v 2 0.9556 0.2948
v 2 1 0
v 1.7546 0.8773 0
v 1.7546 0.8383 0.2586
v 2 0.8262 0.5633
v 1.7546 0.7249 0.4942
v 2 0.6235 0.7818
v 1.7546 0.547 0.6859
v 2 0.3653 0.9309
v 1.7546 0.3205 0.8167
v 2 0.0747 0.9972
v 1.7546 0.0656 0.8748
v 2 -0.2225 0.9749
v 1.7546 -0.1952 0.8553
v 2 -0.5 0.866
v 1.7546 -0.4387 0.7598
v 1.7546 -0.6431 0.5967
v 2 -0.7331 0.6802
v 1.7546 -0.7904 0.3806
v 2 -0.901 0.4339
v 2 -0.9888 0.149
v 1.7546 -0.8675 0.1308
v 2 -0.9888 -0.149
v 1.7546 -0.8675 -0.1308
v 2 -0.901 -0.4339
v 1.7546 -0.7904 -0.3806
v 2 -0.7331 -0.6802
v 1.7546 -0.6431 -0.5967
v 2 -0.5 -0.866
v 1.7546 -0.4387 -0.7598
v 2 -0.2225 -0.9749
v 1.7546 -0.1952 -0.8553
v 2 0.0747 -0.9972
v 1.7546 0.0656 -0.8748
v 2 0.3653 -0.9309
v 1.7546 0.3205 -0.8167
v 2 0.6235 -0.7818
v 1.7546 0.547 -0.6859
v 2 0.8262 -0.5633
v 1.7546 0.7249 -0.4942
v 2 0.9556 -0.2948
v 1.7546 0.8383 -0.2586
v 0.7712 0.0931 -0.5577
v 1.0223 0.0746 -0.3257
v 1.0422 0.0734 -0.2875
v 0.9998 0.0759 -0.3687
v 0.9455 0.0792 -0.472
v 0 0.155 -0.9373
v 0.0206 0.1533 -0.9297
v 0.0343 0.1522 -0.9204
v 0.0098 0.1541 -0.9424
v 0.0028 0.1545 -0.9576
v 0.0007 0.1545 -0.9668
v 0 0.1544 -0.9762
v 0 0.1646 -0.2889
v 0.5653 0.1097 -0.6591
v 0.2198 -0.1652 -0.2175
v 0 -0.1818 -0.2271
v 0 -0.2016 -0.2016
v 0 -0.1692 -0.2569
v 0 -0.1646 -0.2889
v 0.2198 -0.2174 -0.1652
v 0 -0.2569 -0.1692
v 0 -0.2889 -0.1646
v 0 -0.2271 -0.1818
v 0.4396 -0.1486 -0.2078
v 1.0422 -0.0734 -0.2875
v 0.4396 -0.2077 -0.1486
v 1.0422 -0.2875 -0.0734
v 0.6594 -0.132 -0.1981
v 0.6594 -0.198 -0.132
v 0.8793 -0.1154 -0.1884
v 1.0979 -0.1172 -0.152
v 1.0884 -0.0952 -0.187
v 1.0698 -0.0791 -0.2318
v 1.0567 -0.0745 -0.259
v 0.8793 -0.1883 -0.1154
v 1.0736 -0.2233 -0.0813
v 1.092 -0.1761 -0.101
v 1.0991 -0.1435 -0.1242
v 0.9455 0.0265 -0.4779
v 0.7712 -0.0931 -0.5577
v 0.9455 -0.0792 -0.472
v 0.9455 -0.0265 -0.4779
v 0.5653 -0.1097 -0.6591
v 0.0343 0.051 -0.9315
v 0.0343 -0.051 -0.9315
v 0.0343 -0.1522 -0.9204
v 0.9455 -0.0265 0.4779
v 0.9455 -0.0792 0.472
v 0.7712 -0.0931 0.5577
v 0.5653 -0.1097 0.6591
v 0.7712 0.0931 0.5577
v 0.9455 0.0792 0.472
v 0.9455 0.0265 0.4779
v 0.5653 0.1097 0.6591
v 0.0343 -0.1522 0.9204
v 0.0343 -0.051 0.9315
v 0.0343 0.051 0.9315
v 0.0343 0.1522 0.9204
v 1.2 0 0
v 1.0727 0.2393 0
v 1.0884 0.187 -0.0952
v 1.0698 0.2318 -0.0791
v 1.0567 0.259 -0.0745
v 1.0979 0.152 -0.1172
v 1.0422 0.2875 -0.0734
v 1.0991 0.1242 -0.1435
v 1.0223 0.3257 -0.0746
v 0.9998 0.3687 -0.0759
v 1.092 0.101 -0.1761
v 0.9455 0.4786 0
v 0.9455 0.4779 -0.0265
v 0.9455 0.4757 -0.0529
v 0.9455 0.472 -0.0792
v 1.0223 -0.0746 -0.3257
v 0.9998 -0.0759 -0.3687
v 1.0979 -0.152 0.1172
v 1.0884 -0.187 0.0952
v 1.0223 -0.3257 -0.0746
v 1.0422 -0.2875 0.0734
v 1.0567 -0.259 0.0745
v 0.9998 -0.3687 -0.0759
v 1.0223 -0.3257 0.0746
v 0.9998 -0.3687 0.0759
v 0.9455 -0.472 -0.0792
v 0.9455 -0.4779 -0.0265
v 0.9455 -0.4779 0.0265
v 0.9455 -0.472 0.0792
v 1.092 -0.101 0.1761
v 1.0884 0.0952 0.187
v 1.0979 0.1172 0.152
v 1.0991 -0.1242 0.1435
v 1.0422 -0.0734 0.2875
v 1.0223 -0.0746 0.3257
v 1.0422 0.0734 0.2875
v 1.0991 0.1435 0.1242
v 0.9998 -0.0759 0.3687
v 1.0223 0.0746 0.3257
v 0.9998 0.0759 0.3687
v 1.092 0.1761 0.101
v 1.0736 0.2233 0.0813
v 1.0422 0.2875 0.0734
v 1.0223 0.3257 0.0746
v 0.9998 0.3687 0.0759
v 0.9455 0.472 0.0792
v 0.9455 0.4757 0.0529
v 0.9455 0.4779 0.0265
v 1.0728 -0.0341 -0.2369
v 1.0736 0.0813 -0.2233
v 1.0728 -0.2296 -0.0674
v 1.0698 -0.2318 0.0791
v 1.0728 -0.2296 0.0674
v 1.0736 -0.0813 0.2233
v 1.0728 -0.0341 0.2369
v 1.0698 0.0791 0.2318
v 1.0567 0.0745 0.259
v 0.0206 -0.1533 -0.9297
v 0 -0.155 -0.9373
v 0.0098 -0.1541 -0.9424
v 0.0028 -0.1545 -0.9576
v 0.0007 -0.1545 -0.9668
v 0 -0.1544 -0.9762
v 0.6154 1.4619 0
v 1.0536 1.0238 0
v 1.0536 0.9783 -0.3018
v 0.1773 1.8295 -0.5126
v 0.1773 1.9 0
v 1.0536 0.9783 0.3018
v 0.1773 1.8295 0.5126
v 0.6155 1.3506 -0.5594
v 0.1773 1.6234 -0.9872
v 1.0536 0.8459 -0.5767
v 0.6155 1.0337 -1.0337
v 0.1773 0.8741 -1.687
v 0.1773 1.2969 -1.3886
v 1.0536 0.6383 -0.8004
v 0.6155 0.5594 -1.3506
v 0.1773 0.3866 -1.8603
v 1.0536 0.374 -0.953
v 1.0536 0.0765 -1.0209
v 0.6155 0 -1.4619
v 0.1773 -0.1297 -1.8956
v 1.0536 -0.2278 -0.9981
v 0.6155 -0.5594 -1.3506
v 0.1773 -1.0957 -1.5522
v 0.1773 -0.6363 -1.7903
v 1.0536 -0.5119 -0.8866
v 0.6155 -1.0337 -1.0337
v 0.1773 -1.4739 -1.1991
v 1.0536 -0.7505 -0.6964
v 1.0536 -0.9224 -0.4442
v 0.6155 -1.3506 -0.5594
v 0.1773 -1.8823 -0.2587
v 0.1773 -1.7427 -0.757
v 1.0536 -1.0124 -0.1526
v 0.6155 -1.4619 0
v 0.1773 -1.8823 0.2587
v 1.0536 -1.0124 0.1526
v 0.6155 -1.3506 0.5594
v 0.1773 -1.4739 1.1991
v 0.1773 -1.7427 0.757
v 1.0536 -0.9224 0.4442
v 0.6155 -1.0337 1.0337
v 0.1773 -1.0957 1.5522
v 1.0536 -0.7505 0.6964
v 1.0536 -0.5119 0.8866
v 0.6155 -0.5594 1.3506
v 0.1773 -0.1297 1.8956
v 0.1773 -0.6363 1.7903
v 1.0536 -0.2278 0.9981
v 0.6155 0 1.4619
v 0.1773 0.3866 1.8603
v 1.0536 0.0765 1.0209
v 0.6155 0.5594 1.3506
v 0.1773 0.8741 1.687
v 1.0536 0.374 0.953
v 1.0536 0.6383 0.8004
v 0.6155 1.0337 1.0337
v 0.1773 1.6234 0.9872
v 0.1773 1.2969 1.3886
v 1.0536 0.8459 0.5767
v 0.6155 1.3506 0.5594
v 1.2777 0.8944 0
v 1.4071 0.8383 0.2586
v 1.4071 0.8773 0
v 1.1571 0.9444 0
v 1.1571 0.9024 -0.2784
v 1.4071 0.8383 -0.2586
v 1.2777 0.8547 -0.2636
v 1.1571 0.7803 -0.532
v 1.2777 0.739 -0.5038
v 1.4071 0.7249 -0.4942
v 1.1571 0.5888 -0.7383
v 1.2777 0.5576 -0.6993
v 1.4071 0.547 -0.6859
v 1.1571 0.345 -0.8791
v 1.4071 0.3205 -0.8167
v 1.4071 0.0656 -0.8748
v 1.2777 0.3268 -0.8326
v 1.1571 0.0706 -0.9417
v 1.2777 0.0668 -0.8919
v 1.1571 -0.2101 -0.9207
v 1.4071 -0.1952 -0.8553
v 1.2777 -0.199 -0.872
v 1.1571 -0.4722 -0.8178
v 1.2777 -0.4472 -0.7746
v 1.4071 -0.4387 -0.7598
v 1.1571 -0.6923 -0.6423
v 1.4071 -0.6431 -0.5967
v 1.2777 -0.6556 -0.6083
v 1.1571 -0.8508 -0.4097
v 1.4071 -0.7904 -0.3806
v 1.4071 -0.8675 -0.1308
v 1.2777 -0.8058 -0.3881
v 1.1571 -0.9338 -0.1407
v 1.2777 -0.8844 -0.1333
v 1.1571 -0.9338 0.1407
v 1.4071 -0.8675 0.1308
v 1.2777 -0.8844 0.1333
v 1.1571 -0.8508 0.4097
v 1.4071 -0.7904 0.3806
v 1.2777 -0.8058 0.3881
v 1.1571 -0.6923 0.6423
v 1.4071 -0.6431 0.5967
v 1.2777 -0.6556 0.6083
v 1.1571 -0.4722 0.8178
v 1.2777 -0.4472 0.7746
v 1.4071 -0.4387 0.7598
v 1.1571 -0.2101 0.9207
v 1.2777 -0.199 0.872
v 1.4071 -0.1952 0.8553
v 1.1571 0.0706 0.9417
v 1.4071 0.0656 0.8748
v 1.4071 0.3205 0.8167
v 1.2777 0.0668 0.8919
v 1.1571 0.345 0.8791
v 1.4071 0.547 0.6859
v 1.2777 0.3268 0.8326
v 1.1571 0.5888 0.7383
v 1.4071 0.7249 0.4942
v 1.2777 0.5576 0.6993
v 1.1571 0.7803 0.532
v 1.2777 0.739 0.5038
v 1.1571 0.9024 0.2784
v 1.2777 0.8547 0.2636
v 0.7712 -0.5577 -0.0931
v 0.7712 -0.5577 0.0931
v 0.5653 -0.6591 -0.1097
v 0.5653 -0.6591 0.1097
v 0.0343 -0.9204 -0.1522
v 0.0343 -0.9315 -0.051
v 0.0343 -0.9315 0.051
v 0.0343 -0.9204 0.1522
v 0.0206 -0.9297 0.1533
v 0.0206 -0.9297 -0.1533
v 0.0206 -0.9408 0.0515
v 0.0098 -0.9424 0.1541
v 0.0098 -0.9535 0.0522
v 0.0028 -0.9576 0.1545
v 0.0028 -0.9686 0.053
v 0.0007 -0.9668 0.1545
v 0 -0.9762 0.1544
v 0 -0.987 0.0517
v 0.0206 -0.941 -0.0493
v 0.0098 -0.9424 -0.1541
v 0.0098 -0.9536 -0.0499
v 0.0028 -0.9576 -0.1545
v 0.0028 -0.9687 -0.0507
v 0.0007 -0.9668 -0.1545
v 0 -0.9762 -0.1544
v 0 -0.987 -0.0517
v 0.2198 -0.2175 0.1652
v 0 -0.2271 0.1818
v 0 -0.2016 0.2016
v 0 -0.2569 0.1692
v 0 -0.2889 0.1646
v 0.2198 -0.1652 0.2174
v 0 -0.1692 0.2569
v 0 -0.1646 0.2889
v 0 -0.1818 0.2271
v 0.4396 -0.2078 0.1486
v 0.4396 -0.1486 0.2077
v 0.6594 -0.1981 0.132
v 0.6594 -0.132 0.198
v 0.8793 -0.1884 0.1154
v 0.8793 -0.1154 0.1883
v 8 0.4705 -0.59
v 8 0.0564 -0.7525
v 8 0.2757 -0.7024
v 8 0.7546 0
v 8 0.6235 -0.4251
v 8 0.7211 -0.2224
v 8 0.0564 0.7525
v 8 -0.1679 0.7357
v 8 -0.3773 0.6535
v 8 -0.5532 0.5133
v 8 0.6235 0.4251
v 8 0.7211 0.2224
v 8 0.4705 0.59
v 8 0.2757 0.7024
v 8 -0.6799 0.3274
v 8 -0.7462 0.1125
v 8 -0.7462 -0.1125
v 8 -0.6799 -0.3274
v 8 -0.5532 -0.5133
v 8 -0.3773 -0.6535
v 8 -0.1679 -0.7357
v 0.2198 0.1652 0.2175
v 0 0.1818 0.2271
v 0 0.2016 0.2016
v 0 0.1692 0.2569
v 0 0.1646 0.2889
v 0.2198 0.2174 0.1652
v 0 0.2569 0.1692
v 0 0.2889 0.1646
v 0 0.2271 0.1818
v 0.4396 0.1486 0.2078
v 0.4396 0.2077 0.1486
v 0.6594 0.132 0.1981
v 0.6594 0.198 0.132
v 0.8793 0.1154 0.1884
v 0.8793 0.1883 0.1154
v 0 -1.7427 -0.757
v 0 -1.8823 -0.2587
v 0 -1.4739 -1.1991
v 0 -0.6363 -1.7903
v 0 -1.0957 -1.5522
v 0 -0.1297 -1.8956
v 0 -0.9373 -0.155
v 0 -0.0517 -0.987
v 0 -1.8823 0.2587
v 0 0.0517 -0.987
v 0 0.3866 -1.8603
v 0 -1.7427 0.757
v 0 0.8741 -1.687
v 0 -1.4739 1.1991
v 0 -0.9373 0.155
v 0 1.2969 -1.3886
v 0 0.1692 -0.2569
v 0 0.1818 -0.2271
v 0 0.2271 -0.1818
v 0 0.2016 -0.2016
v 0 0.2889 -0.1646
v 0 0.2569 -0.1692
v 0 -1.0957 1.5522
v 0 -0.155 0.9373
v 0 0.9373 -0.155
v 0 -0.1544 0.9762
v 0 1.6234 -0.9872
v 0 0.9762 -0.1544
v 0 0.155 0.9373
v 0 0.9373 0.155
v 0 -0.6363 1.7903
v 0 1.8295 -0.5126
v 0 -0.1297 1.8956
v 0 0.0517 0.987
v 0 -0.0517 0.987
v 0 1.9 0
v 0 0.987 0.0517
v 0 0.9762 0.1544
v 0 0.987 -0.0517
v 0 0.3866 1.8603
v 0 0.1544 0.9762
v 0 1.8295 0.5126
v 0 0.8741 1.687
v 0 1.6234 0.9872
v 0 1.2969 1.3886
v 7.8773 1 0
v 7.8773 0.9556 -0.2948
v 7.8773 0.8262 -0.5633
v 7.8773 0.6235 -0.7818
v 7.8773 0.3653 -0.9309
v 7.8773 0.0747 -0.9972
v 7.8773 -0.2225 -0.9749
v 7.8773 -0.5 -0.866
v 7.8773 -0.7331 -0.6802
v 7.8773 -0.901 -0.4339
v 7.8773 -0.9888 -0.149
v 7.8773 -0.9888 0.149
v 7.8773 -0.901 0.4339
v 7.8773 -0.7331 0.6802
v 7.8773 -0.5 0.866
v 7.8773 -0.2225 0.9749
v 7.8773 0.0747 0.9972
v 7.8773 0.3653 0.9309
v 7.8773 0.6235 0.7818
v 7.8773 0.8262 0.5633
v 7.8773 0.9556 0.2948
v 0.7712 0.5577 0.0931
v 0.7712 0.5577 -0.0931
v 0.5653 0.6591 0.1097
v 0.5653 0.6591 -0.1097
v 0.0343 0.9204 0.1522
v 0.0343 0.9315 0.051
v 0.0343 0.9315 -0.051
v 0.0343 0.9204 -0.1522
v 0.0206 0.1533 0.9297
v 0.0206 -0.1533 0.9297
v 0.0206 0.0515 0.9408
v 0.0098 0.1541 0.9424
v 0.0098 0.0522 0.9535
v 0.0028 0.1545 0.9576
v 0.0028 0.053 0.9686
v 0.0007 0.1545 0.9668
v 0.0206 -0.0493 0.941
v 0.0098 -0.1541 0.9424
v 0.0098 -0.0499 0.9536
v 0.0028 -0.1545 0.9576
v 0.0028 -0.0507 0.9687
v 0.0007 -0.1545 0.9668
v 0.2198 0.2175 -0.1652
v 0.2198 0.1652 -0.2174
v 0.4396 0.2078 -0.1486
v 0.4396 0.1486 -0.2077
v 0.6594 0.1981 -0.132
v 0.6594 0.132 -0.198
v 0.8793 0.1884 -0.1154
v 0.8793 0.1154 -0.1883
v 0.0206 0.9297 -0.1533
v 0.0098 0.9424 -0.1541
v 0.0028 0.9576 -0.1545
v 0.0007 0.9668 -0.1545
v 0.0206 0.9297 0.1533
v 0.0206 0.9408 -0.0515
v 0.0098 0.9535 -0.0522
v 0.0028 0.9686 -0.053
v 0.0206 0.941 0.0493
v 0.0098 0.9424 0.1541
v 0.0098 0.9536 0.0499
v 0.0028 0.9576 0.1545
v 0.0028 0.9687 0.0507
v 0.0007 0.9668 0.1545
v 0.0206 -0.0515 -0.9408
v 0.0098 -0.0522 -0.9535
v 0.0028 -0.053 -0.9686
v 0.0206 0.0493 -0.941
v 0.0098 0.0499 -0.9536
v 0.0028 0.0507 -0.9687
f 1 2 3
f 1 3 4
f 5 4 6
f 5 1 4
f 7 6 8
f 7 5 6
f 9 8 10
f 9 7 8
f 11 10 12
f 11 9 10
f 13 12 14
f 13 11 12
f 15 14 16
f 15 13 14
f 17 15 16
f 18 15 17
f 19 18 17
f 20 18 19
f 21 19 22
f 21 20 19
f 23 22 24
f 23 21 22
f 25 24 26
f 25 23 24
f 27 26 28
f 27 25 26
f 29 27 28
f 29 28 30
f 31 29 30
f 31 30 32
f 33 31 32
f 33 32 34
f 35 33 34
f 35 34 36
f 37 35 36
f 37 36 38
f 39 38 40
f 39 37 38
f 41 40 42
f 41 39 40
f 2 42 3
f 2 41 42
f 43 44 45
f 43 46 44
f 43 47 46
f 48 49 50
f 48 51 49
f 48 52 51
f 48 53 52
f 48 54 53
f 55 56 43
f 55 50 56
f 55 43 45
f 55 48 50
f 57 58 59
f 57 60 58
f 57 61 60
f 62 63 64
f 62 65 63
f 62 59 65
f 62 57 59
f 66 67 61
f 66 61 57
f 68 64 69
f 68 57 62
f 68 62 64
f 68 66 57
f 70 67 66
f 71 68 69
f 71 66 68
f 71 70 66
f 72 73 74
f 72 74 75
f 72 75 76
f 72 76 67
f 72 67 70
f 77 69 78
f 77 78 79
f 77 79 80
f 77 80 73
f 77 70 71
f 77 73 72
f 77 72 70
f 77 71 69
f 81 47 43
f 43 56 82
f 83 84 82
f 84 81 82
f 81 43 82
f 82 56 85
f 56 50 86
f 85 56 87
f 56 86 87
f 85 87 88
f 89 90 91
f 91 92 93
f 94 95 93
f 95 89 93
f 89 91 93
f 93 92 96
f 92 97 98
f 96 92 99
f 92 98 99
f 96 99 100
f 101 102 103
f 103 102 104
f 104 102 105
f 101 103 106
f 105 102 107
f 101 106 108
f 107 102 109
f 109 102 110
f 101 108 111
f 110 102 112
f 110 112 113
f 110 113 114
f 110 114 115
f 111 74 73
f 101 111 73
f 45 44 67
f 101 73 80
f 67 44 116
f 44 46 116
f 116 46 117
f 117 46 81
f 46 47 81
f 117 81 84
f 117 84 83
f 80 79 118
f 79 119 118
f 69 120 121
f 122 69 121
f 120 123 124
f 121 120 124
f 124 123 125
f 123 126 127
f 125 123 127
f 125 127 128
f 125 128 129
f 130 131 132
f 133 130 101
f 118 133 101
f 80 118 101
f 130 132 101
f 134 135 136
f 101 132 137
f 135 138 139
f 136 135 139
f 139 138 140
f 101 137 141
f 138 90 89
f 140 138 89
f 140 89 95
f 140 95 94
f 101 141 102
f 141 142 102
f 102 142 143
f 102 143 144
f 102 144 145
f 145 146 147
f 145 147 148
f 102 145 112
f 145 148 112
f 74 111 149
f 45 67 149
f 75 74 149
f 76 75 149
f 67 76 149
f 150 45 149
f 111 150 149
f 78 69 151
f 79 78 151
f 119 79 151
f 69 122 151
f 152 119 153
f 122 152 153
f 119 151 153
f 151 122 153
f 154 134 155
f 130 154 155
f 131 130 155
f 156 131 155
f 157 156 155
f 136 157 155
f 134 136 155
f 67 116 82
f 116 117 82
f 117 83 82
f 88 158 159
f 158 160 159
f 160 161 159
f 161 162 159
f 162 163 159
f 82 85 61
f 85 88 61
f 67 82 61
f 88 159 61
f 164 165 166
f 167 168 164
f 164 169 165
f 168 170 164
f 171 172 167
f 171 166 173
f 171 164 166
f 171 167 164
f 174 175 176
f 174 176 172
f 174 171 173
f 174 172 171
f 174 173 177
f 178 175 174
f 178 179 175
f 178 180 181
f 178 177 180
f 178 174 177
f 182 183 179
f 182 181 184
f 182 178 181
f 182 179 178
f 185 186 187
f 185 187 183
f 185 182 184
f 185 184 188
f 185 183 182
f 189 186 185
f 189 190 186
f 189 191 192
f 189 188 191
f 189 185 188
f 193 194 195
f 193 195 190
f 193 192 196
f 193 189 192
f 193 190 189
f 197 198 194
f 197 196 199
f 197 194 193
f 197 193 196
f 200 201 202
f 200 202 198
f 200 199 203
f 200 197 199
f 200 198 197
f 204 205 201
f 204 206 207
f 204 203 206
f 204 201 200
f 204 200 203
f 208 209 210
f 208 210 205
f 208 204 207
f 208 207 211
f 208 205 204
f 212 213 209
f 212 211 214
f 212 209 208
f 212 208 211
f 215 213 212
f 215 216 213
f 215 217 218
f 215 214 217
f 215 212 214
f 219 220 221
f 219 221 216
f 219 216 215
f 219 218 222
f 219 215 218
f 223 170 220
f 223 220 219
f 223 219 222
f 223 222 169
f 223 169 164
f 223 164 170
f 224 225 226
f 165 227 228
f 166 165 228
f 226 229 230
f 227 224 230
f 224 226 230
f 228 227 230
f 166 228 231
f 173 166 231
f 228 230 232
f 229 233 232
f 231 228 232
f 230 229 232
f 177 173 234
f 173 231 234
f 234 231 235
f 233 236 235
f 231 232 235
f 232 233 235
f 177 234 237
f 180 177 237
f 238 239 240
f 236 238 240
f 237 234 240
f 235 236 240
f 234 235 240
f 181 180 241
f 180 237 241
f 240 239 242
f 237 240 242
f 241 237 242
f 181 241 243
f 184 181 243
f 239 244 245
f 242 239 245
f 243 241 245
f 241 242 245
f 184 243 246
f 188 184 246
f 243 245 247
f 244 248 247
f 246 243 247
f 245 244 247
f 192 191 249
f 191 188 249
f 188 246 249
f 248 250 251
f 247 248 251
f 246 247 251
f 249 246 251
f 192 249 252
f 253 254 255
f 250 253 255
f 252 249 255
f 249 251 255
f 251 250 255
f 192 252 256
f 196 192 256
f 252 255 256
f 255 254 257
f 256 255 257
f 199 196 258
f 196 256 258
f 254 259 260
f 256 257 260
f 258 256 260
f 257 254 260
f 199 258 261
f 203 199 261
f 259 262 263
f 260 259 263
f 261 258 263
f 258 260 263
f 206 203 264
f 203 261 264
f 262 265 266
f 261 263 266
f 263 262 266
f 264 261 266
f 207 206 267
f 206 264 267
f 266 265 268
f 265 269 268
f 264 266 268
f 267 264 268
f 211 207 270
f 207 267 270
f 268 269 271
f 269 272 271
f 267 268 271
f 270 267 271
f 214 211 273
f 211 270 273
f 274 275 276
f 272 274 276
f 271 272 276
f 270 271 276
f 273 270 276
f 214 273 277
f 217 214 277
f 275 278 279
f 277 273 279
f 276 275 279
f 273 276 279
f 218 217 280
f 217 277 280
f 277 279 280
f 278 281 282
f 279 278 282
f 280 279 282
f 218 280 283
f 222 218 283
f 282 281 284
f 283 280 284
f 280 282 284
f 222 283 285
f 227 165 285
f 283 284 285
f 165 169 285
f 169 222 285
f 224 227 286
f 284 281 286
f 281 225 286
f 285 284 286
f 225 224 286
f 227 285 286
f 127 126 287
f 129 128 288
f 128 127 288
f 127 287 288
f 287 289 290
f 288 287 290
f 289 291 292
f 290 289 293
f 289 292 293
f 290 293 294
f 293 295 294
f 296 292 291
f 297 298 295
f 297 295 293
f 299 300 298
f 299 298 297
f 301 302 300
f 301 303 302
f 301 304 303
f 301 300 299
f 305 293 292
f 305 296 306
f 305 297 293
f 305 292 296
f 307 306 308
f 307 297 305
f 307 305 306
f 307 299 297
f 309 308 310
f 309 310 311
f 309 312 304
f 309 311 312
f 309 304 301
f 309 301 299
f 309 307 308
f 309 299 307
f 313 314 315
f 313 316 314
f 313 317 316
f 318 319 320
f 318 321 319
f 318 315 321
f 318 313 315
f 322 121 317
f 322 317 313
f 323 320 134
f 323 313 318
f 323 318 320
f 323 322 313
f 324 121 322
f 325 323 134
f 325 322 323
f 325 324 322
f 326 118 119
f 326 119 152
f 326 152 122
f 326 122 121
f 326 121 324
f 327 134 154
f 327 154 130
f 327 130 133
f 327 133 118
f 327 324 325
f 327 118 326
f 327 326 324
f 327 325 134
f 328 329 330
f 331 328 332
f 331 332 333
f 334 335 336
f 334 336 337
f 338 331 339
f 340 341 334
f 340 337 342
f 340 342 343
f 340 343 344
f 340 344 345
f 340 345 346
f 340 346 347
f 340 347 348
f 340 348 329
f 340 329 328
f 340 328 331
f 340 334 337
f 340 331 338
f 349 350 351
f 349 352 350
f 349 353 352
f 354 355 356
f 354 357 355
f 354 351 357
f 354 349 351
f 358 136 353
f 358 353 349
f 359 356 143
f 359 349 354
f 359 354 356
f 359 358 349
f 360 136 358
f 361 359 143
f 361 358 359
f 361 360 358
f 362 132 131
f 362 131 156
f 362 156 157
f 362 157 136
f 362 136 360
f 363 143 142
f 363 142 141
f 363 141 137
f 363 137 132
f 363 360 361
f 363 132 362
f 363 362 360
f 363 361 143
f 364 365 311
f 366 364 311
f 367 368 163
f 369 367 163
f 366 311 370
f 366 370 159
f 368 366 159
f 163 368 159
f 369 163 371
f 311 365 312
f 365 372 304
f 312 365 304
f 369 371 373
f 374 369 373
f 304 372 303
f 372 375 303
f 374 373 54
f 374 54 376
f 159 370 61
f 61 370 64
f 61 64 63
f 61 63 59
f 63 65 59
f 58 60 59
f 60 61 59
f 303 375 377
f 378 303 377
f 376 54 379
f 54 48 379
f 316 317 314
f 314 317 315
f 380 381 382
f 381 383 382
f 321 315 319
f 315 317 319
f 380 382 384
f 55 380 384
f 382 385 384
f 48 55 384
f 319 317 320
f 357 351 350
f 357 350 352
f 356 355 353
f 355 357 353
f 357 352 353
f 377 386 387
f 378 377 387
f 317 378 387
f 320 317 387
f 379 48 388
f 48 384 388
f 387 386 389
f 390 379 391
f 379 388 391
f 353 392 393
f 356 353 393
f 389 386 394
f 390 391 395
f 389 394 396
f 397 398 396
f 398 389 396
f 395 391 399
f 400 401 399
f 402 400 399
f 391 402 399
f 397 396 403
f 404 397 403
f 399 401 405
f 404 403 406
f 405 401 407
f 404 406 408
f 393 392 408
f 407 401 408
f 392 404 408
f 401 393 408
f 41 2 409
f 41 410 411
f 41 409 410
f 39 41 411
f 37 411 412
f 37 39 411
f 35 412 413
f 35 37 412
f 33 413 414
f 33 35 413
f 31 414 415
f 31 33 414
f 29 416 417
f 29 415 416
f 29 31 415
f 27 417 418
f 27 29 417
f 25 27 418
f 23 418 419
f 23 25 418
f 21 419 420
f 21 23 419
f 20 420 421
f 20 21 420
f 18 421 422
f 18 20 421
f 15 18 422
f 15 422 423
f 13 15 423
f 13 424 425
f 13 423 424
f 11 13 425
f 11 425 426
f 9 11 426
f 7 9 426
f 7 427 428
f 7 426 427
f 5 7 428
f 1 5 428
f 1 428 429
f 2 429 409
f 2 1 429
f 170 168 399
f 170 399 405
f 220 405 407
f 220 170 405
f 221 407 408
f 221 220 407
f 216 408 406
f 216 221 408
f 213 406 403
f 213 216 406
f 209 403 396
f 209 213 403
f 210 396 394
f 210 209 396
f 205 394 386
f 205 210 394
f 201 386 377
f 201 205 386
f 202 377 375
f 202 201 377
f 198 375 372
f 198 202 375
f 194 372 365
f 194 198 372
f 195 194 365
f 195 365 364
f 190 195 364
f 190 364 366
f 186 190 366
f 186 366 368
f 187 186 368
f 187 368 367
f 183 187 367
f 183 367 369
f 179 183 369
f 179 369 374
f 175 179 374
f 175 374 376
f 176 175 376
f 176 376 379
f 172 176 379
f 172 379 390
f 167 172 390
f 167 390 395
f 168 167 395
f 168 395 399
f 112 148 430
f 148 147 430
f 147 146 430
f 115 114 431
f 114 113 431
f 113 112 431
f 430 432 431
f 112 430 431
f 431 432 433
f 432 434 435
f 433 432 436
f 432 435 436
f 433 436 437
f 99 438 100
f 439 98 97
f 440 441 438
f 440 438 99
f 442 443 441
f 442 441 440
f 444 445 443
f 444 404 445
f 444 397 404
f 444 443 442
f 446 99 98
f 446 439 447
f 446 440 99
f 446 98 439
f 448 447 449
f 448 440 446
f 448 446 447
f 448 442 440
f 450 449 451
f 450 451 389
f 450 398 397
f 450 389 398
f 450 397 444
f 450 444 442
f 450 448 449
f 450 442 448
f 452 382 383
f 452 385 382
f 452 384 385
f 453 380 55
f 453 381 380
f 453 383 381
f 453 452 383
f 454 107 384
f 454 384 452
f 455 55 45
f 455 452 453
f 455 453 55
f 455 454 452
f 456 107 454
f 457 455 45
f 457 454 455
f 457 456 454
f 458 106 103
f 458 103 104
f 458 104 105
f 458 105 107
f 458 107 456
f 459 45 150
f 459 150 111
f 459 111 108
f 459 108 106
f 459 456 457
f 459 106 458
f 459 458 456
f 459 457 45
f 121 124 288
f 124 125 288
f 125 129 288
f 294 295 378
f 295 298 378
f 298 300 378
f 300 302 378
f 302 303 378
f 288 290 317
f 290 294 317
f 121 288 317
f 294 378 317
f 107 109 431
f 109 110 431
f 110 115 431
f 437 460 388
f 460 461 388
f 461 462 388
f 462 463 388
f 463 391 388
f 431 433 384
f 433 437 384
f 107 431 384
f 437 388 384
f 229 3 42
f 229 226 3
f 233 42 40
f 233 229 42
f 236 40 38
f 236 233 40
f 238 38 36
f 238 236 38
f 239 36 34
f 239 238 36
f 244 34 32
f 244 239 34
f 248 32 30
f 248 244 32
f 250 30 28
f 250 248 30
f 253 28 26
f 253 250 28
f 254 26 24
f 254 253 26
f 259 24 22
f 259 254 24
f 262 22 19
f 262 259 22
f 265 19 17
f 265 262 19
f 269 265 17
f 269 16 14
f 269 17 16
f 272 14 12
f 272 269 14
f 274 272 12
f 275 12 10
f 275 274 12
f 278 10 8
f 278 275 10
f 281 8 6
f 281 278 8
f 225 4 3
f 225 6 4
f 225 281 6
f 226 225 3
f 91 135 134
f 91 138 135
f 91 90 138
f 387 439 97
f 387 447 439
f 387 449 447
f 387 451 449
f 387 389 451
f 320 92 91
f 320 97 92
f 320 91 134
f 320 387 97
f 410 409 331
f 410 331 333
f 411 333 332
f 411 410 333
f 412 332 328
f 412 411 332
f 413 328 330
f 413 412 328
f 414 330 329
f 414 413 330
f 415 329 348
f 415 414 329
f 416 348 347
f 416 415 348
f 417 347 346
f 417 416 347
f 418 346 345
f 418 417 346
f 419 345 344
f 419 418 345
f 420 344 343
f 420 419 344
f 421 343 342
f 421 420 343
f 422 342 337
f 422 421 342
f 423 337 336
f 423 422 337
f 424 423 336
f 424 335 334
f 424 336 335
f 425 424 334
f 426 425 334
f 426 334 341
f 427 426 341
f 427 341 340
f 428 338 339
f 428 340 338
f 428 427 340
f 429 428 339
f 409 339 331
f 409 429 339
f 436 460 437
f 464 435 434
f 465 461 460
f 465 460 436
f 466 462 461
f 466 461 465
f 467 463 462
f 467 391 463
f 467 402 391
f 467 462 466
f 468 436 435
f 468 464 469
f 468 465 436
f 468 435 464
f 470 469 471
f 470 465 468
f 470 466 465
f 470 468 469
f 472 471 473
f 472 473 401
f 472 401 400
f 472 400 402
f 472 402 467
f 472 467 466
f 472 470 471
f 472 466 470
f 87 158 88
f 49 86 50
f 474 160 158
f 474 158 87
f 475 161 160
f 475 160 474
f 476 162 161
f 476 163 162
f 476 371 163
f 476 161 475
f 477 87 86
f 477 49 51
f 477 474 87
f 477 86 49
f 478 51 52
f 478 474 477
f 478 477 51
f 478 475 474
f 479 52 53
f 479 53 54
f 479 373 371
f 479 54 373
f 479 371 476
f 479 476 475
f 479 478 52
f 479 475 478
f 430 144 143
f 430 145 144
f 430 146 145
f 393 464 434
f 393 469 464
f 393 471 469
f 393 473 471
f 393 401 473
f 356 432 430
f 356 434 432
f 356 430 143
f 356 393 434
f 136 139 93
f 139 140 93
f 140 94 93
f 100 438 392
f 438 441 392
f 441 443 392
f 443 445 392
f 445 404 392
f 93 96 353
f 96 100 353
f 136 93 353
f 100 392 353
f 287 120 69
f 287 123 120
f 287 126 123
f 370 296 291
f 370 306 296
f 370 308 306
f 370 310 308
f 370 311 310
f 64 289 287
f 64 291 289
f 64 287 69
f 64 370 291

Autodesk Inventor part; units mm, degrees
ref_plane "YZ Plane" through (0, 0, 0) normal (1, 0, 0) x (0, 1, 0)
ref_plane "XZ Plane" through (0, 0, 0) normal (0, 1, 0) x (-1, 0, 0)
sketch "Sketch1" plane through (0, 0, 0) normal (0, 0, 1) x (1, 0, 0)
  line L0 (1.2, 0) -> (8, 0)
  line L1 (8, 0) -> (8, 1)
  line L2 (8, 1) -> (2, 1)
  line L3 (2, 1) -> (1.7546, 0.8773)
  line L4 (1.7546, 0.8773) -> (1.4071, 0.8773)
  line L5 (0, 1.9) -> (0, 0.95)
  line L6 (0, 0.95) -> (0.9455, 0.4786)
  line L7 (0.9455, 0.4786) -> (1.2, 0)
  line L8 (-1.6, 0) -> (9.6, 0) projected
  line L9 (0, -0.38) -> (0, 2.28) projected
  line L10 (0, 1.9) -> (0.1773, 1.9)
  line L11 (0.1773, 1.9) -> (1.0536, 1.0238)
  line L12 (2, 1) -> (1.0773, 1) construction
  arc A0 (1.0536, 1.0238) -> (1.4071, 0.8773) centre (1.4071, 1.3773) ccw
  point P0 (1.2, 0.8773)
  dimension "d1" = 6
  dimension "d2" = 2
  dimension "d3" = 1.7546
  dimension "d4" = 1.9
  dimension "d5" = 26.5
  dimension "d6" = 62
  dimension "d7" = 1.2
  dimension "d8" = 0.2454
  dimension "d12" = 3.8
  dimension "d13" = 45
  dimension "d15" = 8
  dimension "d24" = 1.2
  dimension "d93" = 0.5
revolve "Body" add sketch "Sketch1" angle 360 about axis through (1.2, 0, 0) along (1, 0, 0) contours L7 L6 L5 L10 L11 A0 L4 L3 L2 L1 L0
sketch "Sketch2" plane through (0, 0, 0) normal (-1, 0, 0) x (0, 0, 1)
  line L0 (0, 0.95) -> (0, 0) construction
  line L1 (0, 0) -> (0.95, 0) construction
  arc A0 (0.285, 0) -> (0, 0.285) centre (0, 0) ccw construction
  arc A1 (0.3325, 0) -> (0, 0.3325) centre (0, 0) ccw construction
  arc A2 (0.9373, 0.155) -> (0.155, 0.9373) centre (0, 0) ccw
  line L2 (0, 0) -> (0.6718, 0.6718) construction
  line L3 (0.155, 0.9373) -> (0.1646, 0.2889)
  line L4 (0.9373, 0.155) -> (0.2889, 0.1646)
  arc A3 (0.155, 0.9373) -> (0, 0.95) centre (0, 0) ccw
  arc A4 (0.95, 0) -> (0.9373, 0.155) centre (0, 0) ccw
  line L5 (0, -2.66) -> (0, 2.66) projected
  line L6 (-2.66, 0) -> (2.66, 0) projected
  arc A5 (0.155, -0.9373) -> (0.9373, -0.155) centre (0, 0) ccw
  line L7 (0.155, -0.9373) -> (0.1646, -0.2889)
  line L8 (0.9373, -0.155) -> (0.2889, -0.1646)
  arc A6 (0, -0.95) -> (0.155, -0.9373) centre (0, 0) ccw
  arc A7 (0.9373, -0.155) -> (0.95, 0) centre (0, 0) ccw
  arc A8 (-0.155, 0.9373) -> (-0.9373, 0.155) centre (0, 0) ccw
  line L9 (-0.155, 0.9373) -> (-0.1646, 0.2889)
  line L10 (-0.9373, 0.155) -> (-0.2889, 0.1646)
  arc A9 (0, 0.95) -> (-0.155, 0.9373) centre (0, 0) ccw
  arc A10 (-0.9373, 0.155) -> (-0.95, 0) centre (0, 0) ccw
  arc A11 (-0.155, -0.9373) -> (0, -0.95) centre (0, 0) ccw
  arc A12 (-0.9373, -0.155) -> (-0.155, -0.9373) centre (0, 0) ccw
  arc A13 (-0.95, 0) -> (-0.9373, -0.155) centre (0, 0) ccw
  line L11 (-0.9373, -0.155) -> (-0.2889, -0.1646)
  line L12 (-0.155, -0.9373) -> (-0.1646, -0.2889)
  arc A14 (0.1646, 0.2889) -> (0.2889, 0.1646) centre (0.2908, 0.2908) ccw
  arc A15 (0.2889, -0.1646) -> (0.1646, -0.2889) centre (0.2908, -0.2908) ccw
  arc A16 (-0.2889, 0.1646) -> (-0.1646, 0.2889) centre (-0.2908, 0.2908) ccw
  arc A17 (-0.1646, -0.2889) -> (-0.2889, -0.1646) centre (-0.2908, -0.2908) ccw
  point P0 (0.6718, -0.6718)
  point P1 (-0.6718, 0.6718)
  point P2 (-0.6718, -0.6718)
  dimension "d17" = 0.57
  dimension "d18" = 0.665
  dimension "d19" = 1.9
  dimension "d20" = 45
  dimension "d21" = 0.155
extrude "Slot" add sketch "Sketch2" against normal up to next draft 5 contours L4 A14 L3 A2 | A5 L7 A15 L8 | L9 A16 L10 A8 | A12 L11 A17 L12
fillet "Fillet1" radius 0.062 4 edges at (0, 0.95, 0) (0, 0, -0.95) (0, -0.95, 0) (0, 0, 0.95)
thread "Thread" size "M2x0.4" class "6g" standard "ISO Metric profile" length 6
chamfer "Chamfer1" distance 0.2454 distance2 0.1227 1 edges at (8, -1, 0) measured on face at (8, -0.1182, -0.3117)
ref_plane "Work Plane2" through (3.35, 0, 0) normal (0, 0, -1) x (1, 0, 0)
equation "\"d1\" = GEL"
equation "\"d2\" = GD"
equation "\"d3\" = BDM"
equation "\"d4\" = SDM"
equation "\"d7\" = INTI"
equation "\"d8\" = GAL"
equation "\"d12\" = KOD"
equation "\"d13\" = 0.5 * SEWI"
equation "\"d15\" = NLG"
equation "\"d24\" = KOH"
equation "\"d93\" = R"
equation "\"d17\" = 0.3 * SDM"
equation "\"d18\" = 0.35 * SDM"
equation "\"d19\" = SDM"
equation "\"d21\" = 0.5 * SBR"
equation "\"d23\" = 0.2 * SBR"
equation "\"d10\" = GEL"
equation "\"d25\" = -0.5 * SPD + 0.5 * GD"
equation "\"d26\" = 0.5 * GAL"
equation "\"NLG\" = 8"
equation "\"GEL\" = 6"
equation "\"GAL\" = 0.61345 * PTC"
equation "\"SPD\" = NND - 1.2269 * PTC"
equation "\"KOD\" = 3.8"
equation "\"KOH\" = 1.2"
equation "\"SBR\" = 0.31"
equation "\"INTI\" = 1.2"
equation "\"SDM\" = 1.9"
equation "\"GD\" = NND"
equation "\"BDM\" = NND - GAL"
equation "\"SEWI\" = 90deg"
equation "\"d9\" = SDM"
equation "\"R\" = 0.5"
equation "\"GUL\" = 0.61345 * PTC"
equation "\"TOA\" = 30deg"
equation "\"EPV\" = 2.2"
equation "\"THREADDIA\" = 2"
equation "\"PTC\" = 0.4"
equation "\"NND\" = 2"
equation "\"GD1\" = THREADDIA - 1.2269 * PTC"
properties part number "ISO 7046-1  - M2 x 8 - 4.8 - H" material "Steel"
